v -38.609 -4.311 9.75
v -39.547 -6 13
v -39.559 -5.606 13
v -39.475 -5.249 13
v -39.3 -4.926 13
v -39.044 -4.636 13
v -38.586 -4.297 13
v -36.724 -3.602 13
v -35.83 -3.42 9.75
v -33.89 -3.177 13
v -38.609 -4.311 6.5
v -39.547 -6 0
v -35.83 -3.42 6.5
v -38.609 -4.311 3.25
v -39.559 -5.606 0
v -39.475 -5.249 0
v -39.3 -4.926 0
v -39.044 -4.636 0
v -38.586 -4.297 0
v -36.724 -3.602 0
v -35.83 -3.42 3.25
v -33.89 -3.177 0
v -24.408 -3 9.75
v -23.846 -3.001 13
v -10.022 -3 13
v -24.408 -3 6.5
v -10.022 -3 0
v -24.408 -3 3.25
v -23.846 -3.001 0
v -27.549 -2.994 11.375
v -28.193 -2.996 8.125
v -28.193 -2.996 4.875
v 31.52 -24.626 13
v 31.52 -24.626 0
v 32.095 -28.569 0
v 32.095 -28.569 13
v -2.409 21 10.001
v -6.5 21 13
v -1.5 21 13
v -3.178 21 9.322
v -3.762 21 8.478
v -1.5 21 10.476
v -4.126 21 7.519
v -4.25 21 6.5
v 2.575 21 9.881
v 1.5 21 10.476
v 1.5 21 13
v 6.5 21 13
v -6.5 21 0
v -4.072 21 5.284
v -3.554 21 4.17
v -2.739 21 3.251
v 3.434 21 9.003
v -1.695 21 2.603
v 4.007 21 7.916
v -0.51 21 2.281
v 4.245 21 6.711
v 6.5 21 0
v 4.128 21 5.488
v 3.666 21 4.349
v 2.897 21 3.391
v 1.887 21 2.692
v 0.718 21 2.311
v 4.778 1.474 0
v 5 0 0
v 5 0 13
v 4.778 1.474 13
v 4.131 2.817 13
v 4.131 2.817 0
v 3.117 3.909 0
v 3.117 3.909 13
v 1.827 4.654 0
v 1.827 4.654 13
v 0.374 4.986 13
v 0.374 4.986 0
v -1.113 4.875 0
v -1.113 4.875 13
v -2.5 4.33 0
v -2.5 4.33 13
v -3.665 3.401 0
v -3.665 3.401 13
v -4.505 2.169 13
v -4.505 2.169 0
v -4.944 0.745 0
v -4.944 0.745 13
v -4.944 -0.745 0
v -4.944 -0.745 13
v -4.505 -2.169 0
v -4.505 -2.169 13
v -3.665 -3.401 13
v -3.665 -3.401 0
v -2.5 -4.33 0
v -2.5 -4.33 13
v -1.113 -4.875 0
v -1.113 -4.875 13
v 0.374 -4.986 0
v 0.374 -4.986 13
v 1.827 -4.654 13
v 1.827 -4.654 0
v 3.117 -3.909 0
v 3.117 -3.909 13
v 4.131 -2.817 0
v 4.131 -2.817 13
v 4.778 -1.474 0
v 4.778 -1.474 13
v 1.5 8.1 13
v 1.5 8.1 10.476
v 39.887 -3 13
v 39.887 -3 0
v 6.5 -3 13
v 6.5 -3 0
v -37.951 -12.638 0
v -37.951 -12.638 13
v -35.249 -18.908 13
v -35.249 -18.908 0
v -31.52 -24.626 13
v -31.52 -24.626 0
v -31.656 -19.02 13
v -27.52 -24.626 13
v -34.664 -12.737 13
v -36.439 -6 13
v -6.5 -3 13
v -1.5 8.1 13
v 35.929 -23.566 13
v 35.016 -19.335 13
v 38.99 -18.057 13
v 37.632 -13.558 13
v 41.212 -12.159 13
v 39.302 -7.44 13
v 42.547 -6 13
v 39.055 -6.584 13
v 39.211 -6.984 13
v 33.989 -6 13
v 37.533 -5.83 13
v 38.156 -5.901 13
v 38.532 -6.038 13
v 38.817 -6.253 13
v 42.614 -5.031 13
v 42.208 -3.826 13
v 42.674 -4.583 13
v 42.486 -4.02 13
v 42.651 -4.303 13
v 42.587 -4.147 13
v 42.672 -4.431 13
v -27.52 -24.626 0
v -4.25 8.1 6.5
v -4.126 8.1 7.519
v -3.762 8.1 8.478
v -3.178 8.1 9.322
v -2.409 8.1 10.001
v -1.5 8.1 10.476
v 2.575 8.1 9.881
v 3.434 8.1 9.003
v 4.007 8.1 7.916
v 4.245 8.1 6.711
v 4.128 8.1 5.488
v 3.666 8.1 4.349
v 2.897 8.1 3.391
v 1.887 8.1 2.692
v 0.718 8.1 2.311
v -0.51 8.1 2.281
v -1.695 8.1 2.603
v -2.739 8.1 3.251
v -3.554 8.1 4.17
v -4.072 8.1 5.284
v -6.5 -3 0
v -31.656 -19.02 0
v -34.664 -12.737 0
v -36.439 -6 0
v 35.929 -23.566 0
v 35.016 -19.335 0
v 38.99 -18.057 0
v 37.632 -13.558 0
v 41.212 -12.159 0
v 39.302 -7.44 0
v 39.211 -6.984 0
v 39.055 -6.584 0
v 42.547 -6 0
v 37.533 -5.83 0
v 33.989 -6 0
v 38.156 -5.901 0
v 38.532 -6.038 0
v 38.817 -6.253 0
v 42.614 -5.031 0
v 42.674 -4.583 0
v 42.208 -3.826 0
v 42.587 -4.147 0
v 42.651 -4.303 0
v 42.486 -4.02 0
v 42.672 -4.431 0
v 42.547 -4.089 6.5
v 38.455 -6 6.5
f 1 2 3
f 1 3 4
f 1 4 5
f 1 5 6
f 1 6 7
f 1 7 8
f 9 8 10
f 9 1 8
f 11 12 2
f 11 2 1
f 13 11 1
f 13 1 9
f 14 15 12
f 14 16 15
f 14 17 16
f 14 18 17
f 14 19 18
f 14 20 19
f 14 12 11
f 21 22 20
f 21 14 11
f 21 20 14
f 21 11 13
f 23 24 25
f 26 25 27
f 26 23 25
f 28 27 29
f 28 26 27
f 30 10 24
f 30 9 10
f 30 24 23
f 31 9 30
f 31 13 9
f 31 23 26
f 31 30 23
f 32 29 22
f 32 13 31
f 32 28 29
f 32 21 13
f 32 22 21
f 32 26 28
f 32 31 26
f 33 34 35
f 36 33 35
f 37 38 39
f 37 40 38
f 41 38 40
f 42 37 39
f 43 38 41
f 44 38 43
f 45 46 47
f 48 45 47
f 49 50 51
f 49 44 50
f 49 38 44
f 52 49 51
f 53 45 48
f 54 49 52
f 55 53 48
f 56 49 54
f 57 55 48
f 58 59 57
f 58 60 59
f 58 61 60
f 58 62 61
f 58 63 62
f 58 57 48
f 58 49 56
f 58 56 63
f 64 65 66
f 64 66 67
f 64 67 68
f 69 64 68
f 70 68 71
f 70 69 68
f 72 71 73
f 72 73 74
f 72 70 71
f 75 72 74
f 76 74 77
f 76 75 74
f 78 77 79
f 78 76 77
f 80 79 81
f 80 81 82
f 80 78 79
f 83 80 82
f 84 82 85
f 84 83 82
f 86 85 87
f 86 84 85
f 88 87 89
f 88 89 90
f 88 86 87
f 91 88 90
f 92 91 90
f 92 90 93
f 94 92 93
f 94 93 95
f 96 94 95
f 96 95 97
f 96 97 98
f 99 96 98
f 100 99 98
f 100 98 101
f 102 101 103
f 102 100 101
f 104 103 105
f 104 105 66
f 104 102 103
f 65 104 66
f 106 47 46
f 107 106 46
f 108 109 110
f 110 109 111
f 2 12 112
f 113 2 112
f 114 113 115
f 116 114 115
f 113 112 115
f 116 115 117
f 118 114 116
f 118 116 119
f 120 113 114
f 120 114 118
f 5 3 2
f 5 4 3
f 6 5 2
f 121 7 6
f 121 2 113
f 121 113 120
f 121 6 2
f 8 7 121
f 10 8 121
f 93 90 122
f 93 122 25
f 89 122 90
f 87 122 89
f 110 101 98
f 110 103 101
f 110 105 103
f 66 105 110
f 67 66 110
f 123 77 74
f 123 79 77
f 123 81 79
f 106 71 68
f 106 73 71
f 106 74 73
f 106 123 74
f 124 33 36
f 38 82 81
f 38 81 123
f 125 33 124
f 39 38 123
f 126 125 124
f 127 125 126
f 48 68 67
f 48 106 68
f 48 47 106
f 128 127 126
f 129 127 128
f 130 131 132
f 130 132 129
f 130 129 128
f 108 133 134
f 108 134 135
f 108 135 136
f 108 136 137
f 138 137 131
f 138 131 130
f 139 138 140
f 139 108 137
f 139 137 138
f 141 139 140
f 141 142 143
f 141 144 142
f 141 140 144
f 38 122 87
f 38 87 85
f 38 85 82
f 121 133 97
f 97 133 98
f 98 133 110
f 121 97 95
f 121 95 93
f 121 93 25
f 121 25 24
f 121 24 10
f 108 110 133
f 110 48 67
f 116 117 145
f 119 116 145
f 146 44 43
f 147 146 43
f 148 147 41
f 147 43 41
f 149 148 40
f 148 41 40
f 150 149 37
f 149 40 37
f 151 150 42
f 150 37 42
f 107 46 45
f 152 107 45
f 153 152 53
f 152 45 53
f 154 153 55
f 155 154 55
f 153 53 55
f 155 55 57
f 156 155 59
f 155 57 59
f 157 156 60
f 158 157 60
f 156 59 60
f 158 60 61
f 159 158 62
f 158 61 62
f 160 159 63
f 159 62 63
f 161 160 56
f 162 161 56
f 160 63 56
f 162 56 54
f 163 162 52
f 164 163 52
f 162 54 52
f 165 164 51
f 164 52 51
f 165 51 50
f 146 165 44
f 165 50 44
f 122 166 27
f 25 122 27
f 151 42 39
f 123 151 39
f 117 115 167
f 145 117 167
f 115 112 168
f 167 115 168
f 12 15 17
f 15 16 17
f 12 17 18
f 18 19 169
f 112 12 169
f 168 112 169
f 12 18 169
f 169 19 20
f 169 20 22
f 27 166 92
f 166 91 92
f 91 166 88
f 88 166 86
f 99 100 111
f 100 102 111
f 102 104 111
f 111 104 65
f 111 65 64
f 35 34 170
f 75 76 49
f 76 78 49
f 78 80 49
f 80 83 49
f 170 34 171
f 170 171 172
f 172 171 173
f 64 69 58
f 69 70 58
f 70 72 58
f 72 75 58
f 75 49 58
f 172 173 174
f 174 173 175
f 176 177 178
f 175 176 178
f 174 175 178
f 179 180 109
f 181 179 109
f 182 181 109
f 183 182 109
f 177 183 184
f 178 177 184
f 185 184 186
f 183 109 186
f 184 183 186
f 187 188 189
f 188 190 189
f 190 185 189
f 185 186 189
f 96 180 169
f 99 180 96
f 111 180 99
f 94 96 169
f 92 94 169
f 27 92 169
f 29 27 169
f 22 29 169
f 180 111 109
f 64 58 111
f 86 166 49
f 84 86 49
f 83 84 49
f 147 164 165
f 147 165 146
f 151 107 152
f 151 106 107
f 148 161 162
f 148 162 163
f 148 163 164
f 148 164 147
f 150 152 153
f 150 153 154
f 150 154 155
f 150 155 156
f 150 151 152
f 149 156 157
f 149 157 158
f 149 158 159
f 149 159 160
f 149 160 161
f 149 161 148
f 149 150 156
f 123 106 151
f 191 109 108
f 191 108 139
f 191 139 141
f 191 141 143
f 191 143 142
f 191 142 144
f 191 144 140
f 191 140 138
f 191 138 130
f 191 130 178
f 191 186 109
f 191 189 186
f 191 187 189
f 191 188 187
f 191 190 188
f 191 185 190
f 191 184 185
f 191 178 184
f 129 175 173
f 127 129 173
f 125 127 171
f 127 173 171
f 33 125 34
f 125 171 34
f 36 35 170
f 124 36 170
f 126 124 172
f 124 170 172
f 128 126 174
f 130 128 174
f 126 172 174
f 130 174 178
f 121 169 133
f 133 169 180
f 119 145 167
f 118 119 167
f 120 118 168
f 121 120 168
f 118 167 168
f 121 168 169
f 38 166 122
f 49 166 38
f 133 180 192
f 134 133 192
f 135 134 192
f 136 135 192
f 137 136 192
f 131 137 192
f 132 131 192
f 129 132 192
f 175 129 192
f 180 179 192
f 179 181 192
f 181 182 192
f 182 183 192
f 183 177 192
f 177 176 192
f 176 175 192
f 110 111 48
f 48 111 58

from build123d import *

# Parameters (mm, degrees)
F0_W     = 13
F0_H     = 24
F2_DEPTH = 13
F1_R     = 5
F3_DEPTH = 13
F5_DEPTH = 12.9


with BuildPart() as f2:
    # F0 (on Top) → F2 (new body)
    with BuildSketch(Plane.XY):
        with BuildLine():
            Line((-6.5, -3), (-7.526748348, -3))
            Line((-7.526748348, -3), (-10.0215210102, -3))
            add(Edge.make_bspline(
                [(-39.5474398666, -6), (-39.987434644, -3.0998888332), (-28.0679892003, -2.9708801078), (-24.4776253005, -3.0066990198), (-20.0953720274, -2.997292433), (-10.1037282836, -3), (-10.0215210102, -3)],
                knots=[0, 0, 0, 0, 0.3086092965, 0.5067485278, 0.7164039889, 1, 1, 1, 1], degree=3))
            ThreePointArc((-39.5474398666, -6), (-36.7341364511, -15.8304522737), (-31.5204301443, -24.626459013))
            Line((-31.5204301443, -24.626459013), (-27.5204301443, -24.626459013))
            ThreePointArc((-27.5204301443, -24.626459013), (-33.3084695829, -15.9493702976), (-36.4394917479, -6))
            Line((-36.4394917479, -6), (-6.5, -6))
            Line((-6.5, -6), (-6.5, -3))
        make_face()
        with Locations((0, 9)):
            Rectangle(F0_W, F0_H)
        with BuildLine():
            Line((39.8873413504, -3), (7, -3))
            Line((7, -3), (7, -6))
            Line((7, -6), (33.9890345931, -6))
            add(Edge.make_bspline(
                [(33.9890345931, -6), (35.9057441659, -6.0144707178), (38.6138753682, -5.3537128715), (39.2142802148, -6.7852190746), (39.3019308294, -7.4403113564)],
                knots=[0, 0, 0, 0, 0.6204731295, 1, 1, 1, 1], degree=3))
            ThreePointArc((39.3019308294, -7.4403113564), (36.4388888592, -16.4987083952), (31.5204301443, -24.626459013))
            Line((31.5204301443, -24.626459013), (32.0954321629, -28.5686519366))
            ThreePointArc((32.0954321629, -28.5686519366), (38.990070515, -18.057104985), (42.5474398666, -6))
            add(Edge.make_bspline(
                [(39.8873413504, -3), (40.6612767941, -3.3893066613), (43.3643490326, -3.7338272559), (42.4692446307, -5.1334802328), (42.5474398666, -6)],
                knots=[0, 0, 0, 0, 0.5508525768, 1, 1, 1, 1], degree=3))
        make_face()
        Polygon((6.5, -3), (-6.5, -3), (-6.5, -6), (7, -6), (7, -3), align=None)
    extrude(amount=F2_DEPTH)

    # F1 (on Top) → F3 (cut, through all)
    with BuildSketch(Plane.XY):
        Circle(F1_R)
    extrude(amount=F3_DEPTH, mode=Mode.SUBTRACT)

    # F4 (on face) → F5 (cut)
    with BuildSketch(Plane(origin=(0, 21, 0), x_dir=(-1, 0, 0), z_dir=(0, 1, 0))):
        with BuildLine():
            ThreePointArc((-1.5, 10.4764934301), (-2.4173849507, 3.0044671365), (4.25, 6.5))
            ThreePointArc((4.25, 6.5), (3.4955328635, 8.9173849507), (1.5, 10.4764934301))
            ThreePointArc((1.5, 10.4764934301), (0, 10.75), (-1.5, 10.4764934301))
        make_face()
        with BuildLine():
            ThreePointArc((-1.5, 10.4764934301), (0, 10.75), (1.5, 10.4764934301))
            Line((1.5, 10.4764934301), (1.5, 13))
            Line((1.5, 13), (-1.5, 13))
            Line((-1.5, 13), (-1.5, 10.4764934301))
        make_face()
    extrude(amount=-F5_DEPTH, mode=Mode.SUBTRACT)


solid = f2.part
